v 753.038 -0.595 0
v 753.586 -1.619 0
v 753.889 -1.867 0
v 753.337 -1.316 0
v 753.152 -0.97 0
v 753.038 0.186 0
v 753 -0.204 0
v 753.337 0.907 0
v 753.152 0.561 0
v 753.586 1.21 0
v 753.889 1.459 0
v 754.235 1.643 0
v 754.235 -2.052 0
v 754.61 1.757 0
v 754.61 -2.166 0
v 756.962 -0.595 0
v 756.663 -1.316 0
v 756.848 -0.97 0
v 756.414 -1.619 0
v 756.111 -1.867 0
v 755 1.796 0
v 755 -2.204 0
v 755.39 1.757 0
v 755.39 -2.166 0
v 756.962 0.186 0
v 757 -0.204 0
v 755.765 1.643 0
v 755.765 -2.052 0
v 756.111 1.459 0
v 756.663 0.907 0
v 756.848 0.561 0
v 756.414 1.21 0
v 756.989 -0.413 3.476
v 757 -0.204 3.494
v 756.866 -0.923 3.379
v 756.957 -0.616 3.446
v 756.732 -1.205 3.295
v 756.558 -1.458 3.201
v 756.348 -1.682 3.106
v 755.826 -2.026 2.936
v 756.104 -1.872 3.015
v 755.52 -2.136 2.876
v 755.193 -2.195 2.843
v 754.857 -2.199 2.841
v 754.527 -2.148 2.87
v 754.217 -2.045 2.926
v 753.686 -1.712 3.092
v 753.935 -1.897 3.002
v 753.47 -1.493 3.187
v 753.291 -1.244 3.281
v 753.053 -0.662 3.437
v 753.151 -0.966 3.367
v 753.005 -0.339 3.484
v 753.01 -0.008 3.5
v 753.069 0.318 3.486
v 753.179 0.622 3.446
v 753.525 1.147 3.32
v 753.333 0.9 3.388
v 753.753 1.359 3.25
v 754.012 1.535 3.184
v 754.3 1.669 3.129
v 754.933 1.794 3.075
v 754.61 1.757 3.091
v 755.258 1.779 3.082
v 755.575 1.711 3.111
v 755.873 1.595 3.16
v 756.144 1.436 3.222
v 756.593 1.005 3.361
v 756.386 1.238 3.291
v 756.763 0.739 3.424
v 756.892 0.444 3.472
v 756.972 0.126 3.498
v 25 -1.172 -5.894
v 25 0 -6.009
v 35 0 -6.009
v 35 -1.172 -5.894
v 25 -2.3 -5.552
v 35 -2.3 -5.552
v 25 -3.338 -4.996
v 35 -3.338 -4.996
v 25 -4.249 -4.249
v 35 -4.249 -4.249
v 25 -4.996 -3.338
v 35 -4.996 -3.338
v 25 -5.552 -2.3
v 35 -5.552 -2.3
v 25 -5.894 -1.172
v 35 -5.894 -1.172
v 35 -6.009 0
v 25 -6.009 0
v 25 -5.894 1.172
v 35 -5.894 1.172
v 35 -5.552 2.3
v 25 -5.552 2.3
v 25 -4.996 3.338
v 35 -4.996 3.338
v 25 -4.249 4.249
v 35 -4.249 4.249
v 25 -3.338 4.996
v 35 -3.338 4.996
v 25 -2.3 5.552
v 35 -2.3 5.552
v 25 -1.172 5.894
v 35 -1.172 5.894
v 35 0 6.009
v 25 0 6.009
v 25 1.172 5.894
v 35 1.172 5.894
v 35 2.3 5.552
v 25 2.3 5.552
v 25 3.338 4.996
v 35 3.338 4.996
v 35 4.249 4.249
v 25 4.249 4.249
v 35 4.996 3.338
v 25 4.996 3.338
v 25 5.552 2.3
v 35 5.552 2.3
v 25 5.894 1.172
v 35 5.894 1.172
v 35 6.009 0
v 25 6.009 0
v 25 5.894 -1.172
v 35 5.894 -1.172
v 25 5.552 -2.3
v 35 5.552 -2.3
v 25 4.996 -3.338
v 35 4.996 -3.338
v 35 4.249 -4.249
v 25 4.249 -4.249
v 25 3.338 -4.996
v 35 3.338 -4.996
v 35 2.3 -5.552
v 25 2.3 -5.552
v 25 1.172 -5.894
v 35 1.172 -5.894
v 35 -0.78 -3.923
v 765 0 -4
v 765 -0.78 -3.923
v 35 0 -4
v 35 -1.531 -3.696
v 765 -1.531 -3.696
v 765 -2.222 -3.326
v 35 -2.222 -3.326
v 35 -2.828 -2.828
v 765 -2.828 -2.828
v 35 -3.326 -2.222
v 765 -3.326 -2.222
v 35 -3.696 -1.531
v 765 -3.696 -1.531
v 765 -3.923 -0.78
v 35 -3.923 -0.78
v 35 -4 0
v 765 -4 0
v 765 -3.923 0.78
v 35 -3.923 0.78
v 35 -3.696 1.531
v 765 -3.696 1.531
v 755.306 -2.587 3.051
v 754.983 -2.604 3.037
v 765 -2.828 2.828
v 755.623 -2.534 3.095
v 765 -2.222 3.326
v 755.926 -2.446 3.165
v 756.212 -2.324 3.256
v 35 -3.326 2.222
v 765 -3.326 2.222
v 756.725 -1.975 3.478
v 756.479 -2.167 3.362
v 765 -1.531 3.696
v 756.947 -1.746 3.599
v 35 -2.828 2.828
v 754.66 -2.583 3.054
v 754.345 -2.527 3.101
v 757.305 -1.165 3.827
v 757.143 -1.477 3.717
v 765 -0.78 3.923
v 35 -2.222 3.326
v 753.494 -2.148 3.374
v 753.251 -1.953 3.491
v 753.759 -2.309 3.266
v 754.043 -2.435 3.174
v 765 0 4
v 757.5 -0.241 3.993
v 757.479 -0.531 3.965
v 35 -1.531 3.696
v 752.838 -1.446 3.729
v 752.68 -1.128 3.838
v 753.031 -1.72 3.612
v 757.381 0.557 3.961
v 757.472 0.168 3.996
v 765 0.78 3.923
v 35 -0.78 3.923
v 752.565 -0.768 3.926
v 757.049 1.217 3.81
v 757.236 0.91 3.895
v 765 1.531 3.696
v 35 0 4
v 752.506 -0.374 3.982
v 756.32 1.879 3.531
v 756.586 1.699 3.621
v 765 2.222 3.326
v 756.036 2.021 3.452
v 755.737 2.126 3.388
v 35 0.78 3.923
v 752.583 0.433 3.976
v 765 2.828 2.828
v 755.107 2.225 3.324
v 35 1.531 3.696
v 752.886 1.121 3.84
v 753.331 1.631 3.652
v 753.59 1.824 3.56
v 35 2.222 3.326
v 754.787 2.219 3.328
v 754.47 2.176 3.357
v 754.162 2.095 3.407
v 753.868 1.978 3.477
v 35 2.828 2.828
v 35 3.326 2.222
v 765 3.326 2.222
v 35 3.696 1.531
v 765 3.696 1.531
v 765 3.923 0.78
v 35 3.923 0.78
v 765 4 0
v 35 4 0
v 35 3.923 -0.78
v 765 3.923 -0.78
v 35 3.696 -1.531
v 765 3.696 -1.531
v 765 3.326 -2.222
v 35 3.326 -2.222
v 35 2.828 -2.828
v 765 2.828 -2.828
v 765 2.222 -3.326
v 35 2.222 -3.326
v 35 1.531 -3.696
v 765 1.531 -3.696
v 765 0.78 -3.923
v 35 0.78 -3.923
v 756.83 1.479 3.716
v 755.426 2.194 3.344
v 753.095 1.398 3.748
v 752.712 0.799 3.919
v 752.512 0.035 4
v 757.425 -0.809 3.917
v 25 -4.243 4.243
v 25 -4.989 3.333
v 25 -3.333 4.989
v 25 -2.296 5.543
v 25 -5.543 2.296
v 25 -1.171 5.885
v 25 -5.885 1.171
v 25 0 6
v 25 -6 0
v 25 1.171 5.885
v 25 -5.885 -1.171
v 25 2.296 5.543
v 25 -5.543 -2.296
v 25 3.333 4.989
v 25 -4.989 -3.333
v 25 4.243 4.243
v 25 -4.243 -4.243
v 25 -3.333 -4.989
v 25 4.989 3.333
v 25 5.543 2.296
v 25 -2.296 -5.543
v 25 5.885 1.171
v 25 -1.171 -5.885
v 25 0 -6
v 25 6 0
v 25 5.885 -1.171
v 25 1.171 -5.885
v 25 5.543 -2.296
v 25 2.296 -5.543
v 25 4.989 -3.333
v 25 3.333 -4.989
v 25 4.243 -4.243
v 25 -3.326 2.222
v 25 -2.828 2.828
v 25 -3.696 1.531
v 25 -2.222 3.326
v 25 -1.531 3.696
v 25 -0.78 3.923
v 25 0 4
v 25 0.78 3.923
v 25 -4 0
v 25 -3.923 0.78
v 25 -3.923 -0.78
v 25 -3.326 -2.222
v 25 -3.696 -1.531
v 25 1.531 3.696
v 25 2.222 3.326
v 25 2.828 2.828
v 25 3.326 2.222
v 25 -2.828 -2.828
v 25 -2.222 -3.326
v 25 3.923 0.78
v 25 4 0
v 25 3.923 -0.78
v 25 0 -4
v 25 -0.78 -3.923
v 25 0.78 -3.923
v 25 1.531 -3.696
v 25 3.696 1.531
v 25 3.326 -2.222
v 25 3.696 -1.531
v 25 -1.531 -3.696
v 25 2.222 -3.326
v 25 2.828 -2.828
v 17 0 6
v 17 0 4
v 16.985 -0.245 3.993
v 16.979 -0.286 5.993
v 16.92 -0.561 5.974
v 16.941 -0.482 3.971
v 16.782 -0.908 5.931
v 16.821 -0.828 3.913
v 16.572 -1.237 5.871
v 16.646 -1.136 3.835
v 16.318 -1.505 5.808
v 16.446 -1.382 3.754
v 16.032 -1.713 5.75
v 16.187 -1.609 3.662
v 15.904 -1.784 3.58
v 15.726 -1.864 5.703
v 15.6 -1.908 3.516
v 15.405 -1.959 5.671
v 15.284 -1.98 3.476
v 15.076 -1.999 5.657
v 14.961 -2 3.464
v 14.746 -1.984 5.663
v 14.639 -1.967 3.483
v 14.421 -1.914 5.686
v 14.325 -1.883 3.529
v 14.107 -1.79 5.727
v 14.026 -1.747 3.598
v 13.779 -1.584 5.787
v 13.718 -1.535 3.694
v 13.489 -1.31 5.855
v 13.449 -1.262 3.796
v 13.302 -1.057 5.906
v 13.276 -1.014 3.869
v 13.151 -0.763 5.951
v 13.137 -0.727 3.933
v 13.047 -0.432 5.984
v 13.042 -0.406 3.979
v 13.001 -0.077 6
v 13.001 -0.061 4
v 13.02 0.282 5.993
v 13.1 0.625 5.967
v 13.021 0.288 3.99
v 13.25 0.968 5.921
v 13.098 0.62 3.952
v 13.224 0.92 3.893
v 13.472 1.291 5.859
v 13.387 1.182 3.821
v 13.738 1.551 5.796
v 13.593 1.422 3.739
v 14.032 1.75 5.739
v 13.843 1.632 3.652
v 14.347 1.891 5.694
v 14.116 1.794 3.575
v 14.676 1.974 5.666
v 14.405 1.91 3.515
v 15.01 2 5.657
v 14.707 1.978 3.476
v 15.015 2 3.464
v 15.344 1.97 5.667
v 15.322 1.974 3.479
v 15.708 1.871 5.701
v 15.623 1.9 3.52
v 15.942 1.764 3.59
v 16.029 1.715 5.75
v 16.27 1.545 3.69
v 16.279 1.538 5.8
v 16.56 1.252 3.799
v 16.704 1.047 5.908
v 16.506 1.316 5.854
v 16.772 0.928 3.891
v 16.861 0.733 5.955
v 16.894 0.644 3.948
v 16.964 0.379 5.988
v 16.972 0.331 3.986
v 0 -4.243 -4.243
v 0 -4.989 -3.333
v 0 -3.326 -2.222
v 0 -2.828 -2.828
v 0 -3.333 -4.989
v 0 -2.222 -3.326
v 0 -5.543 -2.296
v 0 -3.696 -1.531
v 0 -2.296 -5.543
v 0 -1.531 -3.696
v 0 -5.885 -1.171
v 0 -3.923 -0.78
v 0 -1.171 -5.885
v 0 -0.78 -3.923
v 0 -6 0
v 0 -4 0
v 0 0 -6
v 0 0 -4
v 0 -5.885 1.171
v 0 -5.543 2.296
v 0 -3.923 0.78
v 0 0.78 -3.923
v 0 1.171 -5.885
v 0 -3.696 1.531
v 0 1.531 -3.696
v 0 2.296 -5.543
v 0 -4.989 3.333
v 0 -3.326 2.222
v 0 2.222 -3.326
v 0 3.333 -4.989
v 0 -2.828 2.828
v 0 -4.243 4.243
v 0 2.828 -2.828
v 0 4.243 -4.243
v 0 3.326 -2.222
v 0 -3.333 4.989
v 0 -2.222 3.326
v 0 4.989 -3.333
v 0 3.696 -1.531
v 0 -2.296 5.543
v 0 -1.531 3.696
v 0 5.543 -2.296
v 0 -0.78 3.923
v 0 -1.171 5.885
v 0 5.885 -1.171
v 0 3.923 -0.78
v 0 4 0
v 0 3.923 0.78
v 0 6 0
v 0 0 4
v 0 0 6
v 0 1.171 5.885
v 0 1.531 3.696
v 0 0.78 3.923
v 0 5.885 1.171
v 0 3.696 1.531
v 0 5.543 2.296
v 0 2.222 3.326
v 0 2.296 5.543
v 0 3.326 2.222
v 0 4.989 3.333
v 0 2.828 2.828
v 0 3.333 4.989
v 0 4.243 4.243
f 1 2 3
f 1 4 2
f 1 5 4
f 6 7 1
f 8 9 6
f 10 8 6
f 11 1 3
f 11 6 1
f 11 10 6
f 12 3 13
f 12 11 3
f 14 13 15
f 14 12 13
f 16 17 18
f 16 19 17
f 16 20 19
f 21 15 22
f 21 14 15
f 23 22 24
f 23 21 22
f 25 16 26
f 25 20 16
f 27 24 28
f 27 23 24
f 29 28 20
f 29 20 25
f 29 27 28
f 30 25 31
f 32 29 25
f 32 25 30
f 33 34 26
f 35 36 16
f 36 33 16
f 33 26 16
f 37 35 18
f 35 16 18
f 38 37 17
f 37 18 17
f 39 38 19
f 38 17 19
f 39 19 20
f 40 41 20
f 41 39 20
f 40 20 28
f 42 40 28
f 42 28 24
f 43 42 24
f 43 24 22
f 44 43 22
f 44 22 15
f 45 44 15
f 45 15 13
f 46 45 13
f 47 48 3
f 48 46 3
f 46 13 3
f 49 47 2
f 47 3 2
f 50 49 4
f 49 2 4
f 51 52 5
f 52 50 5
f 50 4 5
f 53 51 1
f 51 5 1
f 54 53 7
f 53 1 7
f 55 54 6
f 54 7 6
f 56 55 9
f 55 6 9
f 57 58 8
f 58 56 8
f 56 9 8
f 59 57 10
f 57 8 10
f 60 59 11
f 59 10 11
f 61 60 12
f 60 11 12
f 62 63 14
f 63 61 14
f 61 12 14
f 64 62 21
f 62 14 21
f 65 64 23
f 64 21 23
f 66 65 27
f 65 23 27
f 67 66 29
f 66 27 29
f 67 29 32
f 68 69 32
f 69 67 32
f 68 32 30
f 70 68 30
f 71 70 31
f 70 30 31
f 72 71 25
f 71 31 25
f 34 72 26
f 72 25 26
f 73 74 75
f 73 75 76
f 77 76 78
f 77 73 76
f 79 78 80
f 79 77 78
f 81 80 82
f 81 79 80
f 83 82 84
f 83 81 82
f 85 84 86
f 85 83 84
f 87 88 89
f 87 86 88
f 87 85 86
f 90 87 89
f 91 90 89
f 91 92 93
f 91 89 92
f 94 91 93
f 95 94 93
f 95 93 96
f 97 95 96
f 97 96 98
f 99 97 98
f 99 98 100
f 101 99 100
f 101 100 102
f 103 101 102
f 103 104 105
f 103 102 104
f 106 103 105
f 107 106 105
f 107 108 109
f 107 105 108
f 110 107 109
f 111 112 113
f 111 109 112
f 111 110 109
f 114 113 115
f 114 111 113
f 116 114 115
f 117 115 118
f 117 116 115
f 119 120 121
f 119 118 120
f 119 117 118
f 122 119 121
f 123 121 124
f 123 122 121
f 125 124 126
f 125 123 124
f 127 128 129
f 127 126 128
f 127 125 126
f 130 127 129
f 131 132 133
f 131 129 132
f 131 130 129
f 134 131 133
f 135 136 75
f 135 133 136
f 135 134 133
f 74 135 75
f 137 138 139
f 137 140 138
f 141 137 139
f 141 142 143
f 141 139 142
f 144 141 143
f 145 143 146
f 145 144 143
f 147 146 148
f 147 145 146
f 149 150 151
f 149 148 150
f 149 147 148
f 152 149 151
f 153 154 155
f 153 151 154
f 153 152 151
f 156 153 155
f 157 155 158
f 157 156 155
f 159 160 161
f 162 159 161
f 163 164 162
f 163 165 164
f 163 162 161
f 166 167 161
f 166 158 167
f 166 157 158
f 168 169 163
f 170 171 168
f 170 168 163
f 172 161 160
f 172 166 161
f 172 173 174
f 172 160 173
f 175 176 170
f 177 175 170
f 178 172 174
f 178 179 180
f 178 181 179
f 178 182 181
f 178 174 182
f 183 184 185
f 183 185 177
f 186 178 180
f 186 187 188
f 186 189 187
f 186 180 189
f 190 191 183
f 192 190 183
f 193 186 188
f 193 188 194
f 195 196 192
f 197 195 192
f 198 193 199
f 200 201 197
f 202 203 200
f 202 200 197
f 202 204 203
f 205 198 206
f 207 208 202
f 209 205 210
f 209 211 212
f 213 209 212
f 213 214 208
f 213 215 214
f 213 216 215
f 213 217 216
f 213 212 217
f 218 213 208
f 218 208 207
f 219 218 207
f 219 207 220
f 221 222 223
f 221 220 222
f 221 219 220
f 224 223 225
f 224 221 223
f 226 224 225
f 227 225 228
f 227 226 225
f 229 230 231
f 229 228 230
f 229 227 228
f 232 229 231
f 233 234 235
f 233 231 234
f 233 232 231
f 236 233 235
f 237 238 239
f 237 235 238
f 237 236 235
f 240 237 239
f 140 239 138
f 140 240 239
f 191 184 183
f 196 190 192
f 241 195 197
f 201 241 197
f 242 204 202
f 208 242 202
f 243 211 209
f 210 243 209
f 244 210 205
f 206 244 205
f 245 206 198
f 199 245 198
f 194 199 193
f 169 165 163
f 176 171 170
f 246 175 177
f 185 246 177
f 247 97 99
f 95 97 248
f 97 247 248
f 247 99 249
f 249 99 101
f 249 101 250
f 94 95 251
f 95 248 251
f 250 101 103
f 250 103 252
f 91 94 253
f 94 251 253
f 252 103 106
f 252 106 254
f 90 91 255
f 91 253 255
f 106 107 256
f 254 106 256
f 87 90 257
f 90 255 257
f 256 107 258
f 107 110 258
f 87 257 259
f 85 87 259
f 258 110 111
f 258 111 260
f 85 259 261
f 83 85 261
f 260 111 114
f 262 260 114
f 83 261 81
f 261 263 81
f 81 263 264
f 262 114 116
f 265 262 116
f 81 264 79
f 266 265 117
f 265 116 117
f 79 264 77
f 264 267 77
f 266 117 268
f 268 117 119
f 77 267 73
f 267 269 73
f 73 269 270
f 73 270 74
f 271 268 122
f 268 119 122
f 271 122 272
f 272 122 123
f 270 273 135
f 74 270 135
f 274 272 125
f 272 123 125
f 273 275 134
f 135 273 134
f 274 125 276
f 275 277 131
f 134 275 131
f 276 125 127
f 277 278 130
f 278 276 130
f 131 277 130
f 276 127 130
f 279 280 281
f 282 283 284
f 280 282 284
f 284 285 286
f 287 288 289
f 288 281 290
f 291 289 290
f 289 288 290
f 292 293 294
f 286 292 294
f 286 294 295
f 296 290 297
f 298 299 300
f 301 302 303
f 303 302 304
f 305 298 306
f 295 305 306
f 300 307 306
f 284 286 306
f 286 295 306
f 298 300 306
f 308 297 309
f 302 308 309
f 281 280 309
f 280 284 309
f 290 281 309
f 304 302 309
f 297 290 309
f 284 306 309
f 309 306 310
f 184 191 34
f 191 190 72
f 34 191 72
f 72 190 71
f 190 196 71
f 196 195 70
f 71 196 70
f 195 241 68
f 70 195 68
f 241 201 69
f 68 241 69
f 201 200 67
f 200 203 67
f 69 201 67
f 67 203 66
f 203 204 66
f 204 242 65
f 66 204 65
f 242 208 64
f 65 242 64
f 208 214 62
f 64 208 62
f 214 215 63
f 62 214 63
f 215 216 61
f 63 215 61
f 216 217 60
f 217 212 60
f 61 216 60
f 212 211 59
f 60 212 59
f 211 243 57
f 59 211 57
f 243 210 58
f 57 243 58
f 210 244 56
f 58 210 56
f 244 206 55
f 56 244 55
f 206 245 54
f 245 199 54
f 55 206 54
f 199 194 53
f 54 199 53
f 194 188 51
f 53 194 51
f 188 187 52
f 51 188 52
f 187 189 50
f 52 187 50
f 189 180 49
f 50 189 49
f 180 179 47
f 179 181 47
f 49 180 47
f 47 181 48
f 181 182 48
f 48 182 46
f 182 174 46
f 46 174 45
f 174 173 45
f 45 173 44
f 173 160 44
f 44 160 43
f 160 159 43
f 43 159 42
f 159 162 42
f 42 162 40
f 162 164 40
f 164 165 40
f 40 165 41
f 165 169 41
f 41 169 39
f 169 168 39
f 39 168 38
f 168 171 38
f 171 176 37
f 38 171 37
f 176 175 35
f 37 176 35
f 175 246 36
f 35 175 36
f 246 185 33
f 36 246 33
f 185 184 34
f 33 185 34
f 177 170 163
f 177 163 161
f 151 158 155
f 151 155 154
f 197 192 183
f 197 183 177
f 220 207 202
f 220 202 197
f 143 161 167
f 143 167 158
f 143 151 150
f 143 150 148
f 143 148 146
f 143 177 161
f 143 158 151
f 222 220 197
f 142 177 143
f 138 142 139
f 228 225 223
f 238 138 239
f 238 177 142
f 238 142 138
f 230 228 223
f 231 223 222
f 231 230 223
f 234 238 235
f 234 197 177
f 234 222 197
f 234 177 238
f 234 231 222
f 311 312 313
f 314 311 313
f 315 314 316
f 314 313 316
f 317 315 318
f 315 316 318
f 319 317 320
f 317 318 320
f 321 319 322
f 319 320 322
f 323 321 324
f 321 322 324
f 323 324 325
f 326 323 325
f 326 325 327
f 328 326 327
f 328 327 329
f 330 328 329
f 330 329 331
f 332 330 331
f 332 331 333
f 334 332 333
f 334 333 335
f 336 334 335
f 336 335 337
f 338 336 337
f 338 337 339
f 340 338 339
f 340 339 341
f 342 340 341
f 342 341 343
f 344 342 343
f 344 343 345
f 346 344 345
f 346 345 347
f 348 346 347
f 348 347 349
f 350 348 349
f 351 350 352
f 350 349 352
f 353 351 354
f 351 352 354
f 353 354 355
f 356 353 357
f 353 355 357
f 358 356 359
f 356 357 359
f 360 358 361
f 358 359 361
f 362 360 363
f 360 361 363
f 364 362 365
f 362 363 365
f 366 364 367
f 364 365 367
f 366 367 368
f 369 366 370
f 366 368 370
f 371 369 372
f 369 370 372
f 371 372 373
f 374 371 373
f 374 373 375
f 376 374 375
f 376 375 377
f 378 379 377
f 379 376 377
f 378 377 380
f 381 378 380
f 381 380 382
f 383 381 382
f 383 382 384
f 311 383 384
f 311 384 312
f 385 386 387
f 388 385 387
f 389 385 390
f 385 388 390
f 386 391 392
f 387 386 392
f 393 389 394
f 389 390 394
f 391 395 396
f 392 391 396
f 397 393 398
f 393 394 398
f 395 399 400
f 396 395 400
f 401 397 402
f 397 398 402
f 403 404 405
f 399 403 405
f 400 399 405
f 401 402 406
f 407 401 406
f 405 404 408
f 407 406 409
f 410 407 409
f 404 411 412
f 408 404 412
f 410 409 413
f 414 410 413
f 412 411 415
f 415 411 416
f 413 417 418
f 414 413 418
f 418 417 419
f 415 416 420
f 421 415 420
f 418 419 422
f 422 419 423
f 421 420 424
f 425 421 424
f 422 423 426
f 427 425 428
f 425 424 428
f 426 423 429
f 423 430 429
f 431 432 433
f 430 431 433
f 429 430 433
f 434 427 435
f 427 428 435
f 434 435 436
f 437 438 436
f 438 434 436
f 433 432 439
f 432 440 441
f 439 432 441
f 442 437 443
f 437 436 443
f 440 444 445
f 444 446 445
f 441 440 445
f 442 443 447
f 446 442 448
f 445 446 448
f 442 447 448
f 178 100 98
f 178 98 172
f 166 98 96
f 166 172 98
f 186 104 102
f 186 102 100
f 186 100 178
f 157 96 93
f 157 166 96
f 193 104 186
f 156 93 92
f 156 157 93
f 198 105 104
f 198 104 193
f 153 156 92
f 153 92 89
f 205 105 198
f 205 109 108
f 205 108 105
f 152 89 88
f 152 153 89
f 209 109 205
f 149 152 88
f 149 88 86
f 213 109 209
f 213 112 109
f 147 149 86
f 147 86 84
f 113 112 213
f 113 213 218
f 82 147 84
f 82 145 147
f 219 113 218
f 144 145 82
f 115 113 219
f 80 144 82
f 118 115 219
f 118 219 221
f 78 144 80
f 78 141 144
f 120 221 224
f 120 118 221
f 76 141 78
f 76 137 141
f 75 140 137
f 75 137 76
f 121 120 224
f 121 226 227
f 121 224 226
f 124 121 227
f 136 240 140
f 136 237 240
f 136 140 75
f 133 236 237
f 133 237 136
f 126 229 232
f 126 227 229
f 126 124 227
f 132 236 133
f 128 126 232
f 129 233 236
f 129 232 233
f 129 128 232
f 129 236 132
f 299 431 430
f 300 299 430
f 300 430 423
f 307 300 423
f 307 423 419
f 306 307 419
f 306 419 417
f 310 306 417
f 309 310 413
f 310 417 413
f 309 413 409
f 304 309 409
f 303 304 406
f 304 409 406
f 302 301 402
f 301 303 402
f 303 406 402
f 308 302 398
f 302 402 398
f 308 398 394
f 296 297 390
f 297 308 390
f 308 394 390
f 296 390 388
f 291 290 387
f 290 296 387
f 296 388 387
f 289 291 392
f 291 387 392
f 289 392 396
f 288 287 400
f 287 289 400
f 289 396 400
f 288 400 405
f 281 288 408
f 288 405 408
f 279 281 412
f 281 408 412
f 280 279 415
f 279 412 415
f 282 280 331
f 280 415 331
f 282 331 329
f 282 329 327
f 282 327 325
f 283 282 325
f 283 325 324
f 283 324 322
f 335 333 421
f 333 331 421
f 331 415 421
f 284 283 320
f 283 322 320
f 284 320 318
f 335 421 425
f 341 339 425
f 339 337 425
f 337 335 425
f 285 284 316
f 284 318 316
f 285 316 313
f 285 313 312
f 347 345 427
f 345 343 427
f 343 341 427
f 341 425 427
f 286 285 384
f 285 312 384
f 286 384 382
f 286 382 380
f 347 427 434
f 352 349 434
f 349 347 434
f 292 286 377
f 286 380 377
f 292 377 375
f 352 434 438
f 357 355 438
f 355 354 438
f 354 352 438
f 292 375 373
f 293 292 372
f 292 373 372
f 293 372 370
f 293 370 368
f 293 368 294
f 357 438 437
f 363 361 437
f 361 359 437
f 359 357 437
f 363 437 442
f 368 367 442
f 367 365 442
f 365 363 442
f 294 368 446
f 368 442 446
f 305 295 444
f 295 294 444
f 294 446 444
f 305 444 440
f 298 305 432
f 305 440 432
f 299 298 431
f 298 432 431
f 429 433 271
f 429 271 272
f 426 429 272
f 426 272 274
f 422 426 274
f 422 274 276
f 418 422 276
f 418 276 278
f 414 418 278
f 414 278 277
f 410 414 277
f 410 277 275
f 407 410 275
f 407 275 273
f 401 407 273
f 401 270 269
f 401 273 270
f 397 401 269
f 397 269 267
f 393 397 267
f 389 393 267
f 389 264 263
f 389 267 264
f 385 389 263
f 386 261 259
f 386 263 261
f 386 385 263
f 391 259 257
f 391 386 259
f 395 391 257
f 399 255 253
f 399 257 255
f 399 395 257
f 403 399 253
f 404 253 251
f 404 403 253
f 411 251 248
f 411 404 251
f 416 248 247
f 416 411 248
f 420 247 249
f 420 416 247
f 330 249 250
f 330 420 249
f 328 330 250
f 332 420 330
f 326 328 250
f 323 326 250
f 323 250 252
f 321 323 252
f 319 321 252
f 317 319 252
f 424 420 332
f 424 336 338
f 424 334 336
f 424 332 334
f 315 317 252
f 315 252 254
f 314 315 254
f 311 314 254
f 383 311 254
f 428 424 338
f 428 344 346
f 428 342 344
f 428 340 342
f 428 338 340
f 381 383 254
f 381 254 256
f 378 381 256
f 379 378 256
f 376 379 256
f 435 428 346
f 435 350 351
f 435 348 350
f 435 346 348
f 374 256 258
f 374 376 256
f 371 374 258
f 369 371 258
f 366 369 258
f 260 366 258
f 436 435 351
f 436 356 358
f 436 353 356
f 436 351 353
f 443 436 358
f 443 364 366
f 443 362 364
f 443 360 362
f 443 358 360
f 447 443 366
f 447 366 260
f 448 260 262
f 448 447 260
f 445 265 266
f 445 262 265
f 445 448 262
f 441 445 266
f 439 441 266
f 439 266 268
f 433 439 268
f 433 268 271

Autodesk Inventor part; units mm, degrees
ref_plane "YZ Plane" through (0, 0, 0) normal (1, 0, 0) x (0, 1, 0)
ref_plane "XZ Plane" through (0, 0, 0) normal (0, 1, 0) x (-1, 0, 0)
ref_plane "XY Plane" through (0, 0, 0) normal (0, 0, 1) x (1, 0, 0)
sketch "Sketch1" plane through (0, 0, 0) normal (1, 0, 0) x (0, 1, 0)
  circle A0 centre (0, 0) radius 4
  circle A1 centre (0, 0) radius 6
  dimension "d0" = 8
  dimension "d1" = 12
extrude "Extrusion1" add sketch "Sketch1" along normal blind 25
sketch "Sketch2" plane through (25, 0, 0) normal (1, 0, 0) x (0, 0, -1)
  circle A0 centre (0, 0) radius 4
extrude "Extrusion2" add sketch "Sketch2" along normal blind 740
sketch "Sketch3" plane through (25, 0, 0) normal (1, 0, 0) x (0, 0, -1)
  circle A0 centre (0, 0) radius 4
  circle A1 centre (0, 0) radius 6.0091
extrude "Extrusion3" add sketch "Sketch3" along normal blind 10
sketch "Sketch4" plane through (0, 0, 0) normal (0, 0, 1) x (1, 0, 0)
  line L0 (25, 4) -> (25, -4) projected
  line L1 (25, 0) -> (15, 0)
  circle A0 centre (15, 0) radius 2
  point P0 (0, 0)
  dimension "d9" = 10
  dimension "d10" = 4
extrude "Extrusion4" cut sketch "Sketch4" along normal blind 740
thread "Thread1" size "M4x0.7" class "6H" standard "ANSI Metric M Profile" length 15
sketch "Sketch5" plane through (0, 0, 0) normal (0, 0, 1) x (1, 0, 0)
  line L0 (765, -4) -> (765, 4) projected
  line L1 (765, 0) -> (755, 0)
  circle A0 centre (755, -0.2044) radius 2
  point P0 (0, 0)
  dimension "d15" = 10
  dimension "d16" = 4
extrude "Extrusion5" cut sketch "Sketch5" along normal blind 60
chamfer "Chamfer1" distance 0.5 angle 45 1 edges at (753.0009, -0.2632, 3.9913)
properties part number "700_achse"
